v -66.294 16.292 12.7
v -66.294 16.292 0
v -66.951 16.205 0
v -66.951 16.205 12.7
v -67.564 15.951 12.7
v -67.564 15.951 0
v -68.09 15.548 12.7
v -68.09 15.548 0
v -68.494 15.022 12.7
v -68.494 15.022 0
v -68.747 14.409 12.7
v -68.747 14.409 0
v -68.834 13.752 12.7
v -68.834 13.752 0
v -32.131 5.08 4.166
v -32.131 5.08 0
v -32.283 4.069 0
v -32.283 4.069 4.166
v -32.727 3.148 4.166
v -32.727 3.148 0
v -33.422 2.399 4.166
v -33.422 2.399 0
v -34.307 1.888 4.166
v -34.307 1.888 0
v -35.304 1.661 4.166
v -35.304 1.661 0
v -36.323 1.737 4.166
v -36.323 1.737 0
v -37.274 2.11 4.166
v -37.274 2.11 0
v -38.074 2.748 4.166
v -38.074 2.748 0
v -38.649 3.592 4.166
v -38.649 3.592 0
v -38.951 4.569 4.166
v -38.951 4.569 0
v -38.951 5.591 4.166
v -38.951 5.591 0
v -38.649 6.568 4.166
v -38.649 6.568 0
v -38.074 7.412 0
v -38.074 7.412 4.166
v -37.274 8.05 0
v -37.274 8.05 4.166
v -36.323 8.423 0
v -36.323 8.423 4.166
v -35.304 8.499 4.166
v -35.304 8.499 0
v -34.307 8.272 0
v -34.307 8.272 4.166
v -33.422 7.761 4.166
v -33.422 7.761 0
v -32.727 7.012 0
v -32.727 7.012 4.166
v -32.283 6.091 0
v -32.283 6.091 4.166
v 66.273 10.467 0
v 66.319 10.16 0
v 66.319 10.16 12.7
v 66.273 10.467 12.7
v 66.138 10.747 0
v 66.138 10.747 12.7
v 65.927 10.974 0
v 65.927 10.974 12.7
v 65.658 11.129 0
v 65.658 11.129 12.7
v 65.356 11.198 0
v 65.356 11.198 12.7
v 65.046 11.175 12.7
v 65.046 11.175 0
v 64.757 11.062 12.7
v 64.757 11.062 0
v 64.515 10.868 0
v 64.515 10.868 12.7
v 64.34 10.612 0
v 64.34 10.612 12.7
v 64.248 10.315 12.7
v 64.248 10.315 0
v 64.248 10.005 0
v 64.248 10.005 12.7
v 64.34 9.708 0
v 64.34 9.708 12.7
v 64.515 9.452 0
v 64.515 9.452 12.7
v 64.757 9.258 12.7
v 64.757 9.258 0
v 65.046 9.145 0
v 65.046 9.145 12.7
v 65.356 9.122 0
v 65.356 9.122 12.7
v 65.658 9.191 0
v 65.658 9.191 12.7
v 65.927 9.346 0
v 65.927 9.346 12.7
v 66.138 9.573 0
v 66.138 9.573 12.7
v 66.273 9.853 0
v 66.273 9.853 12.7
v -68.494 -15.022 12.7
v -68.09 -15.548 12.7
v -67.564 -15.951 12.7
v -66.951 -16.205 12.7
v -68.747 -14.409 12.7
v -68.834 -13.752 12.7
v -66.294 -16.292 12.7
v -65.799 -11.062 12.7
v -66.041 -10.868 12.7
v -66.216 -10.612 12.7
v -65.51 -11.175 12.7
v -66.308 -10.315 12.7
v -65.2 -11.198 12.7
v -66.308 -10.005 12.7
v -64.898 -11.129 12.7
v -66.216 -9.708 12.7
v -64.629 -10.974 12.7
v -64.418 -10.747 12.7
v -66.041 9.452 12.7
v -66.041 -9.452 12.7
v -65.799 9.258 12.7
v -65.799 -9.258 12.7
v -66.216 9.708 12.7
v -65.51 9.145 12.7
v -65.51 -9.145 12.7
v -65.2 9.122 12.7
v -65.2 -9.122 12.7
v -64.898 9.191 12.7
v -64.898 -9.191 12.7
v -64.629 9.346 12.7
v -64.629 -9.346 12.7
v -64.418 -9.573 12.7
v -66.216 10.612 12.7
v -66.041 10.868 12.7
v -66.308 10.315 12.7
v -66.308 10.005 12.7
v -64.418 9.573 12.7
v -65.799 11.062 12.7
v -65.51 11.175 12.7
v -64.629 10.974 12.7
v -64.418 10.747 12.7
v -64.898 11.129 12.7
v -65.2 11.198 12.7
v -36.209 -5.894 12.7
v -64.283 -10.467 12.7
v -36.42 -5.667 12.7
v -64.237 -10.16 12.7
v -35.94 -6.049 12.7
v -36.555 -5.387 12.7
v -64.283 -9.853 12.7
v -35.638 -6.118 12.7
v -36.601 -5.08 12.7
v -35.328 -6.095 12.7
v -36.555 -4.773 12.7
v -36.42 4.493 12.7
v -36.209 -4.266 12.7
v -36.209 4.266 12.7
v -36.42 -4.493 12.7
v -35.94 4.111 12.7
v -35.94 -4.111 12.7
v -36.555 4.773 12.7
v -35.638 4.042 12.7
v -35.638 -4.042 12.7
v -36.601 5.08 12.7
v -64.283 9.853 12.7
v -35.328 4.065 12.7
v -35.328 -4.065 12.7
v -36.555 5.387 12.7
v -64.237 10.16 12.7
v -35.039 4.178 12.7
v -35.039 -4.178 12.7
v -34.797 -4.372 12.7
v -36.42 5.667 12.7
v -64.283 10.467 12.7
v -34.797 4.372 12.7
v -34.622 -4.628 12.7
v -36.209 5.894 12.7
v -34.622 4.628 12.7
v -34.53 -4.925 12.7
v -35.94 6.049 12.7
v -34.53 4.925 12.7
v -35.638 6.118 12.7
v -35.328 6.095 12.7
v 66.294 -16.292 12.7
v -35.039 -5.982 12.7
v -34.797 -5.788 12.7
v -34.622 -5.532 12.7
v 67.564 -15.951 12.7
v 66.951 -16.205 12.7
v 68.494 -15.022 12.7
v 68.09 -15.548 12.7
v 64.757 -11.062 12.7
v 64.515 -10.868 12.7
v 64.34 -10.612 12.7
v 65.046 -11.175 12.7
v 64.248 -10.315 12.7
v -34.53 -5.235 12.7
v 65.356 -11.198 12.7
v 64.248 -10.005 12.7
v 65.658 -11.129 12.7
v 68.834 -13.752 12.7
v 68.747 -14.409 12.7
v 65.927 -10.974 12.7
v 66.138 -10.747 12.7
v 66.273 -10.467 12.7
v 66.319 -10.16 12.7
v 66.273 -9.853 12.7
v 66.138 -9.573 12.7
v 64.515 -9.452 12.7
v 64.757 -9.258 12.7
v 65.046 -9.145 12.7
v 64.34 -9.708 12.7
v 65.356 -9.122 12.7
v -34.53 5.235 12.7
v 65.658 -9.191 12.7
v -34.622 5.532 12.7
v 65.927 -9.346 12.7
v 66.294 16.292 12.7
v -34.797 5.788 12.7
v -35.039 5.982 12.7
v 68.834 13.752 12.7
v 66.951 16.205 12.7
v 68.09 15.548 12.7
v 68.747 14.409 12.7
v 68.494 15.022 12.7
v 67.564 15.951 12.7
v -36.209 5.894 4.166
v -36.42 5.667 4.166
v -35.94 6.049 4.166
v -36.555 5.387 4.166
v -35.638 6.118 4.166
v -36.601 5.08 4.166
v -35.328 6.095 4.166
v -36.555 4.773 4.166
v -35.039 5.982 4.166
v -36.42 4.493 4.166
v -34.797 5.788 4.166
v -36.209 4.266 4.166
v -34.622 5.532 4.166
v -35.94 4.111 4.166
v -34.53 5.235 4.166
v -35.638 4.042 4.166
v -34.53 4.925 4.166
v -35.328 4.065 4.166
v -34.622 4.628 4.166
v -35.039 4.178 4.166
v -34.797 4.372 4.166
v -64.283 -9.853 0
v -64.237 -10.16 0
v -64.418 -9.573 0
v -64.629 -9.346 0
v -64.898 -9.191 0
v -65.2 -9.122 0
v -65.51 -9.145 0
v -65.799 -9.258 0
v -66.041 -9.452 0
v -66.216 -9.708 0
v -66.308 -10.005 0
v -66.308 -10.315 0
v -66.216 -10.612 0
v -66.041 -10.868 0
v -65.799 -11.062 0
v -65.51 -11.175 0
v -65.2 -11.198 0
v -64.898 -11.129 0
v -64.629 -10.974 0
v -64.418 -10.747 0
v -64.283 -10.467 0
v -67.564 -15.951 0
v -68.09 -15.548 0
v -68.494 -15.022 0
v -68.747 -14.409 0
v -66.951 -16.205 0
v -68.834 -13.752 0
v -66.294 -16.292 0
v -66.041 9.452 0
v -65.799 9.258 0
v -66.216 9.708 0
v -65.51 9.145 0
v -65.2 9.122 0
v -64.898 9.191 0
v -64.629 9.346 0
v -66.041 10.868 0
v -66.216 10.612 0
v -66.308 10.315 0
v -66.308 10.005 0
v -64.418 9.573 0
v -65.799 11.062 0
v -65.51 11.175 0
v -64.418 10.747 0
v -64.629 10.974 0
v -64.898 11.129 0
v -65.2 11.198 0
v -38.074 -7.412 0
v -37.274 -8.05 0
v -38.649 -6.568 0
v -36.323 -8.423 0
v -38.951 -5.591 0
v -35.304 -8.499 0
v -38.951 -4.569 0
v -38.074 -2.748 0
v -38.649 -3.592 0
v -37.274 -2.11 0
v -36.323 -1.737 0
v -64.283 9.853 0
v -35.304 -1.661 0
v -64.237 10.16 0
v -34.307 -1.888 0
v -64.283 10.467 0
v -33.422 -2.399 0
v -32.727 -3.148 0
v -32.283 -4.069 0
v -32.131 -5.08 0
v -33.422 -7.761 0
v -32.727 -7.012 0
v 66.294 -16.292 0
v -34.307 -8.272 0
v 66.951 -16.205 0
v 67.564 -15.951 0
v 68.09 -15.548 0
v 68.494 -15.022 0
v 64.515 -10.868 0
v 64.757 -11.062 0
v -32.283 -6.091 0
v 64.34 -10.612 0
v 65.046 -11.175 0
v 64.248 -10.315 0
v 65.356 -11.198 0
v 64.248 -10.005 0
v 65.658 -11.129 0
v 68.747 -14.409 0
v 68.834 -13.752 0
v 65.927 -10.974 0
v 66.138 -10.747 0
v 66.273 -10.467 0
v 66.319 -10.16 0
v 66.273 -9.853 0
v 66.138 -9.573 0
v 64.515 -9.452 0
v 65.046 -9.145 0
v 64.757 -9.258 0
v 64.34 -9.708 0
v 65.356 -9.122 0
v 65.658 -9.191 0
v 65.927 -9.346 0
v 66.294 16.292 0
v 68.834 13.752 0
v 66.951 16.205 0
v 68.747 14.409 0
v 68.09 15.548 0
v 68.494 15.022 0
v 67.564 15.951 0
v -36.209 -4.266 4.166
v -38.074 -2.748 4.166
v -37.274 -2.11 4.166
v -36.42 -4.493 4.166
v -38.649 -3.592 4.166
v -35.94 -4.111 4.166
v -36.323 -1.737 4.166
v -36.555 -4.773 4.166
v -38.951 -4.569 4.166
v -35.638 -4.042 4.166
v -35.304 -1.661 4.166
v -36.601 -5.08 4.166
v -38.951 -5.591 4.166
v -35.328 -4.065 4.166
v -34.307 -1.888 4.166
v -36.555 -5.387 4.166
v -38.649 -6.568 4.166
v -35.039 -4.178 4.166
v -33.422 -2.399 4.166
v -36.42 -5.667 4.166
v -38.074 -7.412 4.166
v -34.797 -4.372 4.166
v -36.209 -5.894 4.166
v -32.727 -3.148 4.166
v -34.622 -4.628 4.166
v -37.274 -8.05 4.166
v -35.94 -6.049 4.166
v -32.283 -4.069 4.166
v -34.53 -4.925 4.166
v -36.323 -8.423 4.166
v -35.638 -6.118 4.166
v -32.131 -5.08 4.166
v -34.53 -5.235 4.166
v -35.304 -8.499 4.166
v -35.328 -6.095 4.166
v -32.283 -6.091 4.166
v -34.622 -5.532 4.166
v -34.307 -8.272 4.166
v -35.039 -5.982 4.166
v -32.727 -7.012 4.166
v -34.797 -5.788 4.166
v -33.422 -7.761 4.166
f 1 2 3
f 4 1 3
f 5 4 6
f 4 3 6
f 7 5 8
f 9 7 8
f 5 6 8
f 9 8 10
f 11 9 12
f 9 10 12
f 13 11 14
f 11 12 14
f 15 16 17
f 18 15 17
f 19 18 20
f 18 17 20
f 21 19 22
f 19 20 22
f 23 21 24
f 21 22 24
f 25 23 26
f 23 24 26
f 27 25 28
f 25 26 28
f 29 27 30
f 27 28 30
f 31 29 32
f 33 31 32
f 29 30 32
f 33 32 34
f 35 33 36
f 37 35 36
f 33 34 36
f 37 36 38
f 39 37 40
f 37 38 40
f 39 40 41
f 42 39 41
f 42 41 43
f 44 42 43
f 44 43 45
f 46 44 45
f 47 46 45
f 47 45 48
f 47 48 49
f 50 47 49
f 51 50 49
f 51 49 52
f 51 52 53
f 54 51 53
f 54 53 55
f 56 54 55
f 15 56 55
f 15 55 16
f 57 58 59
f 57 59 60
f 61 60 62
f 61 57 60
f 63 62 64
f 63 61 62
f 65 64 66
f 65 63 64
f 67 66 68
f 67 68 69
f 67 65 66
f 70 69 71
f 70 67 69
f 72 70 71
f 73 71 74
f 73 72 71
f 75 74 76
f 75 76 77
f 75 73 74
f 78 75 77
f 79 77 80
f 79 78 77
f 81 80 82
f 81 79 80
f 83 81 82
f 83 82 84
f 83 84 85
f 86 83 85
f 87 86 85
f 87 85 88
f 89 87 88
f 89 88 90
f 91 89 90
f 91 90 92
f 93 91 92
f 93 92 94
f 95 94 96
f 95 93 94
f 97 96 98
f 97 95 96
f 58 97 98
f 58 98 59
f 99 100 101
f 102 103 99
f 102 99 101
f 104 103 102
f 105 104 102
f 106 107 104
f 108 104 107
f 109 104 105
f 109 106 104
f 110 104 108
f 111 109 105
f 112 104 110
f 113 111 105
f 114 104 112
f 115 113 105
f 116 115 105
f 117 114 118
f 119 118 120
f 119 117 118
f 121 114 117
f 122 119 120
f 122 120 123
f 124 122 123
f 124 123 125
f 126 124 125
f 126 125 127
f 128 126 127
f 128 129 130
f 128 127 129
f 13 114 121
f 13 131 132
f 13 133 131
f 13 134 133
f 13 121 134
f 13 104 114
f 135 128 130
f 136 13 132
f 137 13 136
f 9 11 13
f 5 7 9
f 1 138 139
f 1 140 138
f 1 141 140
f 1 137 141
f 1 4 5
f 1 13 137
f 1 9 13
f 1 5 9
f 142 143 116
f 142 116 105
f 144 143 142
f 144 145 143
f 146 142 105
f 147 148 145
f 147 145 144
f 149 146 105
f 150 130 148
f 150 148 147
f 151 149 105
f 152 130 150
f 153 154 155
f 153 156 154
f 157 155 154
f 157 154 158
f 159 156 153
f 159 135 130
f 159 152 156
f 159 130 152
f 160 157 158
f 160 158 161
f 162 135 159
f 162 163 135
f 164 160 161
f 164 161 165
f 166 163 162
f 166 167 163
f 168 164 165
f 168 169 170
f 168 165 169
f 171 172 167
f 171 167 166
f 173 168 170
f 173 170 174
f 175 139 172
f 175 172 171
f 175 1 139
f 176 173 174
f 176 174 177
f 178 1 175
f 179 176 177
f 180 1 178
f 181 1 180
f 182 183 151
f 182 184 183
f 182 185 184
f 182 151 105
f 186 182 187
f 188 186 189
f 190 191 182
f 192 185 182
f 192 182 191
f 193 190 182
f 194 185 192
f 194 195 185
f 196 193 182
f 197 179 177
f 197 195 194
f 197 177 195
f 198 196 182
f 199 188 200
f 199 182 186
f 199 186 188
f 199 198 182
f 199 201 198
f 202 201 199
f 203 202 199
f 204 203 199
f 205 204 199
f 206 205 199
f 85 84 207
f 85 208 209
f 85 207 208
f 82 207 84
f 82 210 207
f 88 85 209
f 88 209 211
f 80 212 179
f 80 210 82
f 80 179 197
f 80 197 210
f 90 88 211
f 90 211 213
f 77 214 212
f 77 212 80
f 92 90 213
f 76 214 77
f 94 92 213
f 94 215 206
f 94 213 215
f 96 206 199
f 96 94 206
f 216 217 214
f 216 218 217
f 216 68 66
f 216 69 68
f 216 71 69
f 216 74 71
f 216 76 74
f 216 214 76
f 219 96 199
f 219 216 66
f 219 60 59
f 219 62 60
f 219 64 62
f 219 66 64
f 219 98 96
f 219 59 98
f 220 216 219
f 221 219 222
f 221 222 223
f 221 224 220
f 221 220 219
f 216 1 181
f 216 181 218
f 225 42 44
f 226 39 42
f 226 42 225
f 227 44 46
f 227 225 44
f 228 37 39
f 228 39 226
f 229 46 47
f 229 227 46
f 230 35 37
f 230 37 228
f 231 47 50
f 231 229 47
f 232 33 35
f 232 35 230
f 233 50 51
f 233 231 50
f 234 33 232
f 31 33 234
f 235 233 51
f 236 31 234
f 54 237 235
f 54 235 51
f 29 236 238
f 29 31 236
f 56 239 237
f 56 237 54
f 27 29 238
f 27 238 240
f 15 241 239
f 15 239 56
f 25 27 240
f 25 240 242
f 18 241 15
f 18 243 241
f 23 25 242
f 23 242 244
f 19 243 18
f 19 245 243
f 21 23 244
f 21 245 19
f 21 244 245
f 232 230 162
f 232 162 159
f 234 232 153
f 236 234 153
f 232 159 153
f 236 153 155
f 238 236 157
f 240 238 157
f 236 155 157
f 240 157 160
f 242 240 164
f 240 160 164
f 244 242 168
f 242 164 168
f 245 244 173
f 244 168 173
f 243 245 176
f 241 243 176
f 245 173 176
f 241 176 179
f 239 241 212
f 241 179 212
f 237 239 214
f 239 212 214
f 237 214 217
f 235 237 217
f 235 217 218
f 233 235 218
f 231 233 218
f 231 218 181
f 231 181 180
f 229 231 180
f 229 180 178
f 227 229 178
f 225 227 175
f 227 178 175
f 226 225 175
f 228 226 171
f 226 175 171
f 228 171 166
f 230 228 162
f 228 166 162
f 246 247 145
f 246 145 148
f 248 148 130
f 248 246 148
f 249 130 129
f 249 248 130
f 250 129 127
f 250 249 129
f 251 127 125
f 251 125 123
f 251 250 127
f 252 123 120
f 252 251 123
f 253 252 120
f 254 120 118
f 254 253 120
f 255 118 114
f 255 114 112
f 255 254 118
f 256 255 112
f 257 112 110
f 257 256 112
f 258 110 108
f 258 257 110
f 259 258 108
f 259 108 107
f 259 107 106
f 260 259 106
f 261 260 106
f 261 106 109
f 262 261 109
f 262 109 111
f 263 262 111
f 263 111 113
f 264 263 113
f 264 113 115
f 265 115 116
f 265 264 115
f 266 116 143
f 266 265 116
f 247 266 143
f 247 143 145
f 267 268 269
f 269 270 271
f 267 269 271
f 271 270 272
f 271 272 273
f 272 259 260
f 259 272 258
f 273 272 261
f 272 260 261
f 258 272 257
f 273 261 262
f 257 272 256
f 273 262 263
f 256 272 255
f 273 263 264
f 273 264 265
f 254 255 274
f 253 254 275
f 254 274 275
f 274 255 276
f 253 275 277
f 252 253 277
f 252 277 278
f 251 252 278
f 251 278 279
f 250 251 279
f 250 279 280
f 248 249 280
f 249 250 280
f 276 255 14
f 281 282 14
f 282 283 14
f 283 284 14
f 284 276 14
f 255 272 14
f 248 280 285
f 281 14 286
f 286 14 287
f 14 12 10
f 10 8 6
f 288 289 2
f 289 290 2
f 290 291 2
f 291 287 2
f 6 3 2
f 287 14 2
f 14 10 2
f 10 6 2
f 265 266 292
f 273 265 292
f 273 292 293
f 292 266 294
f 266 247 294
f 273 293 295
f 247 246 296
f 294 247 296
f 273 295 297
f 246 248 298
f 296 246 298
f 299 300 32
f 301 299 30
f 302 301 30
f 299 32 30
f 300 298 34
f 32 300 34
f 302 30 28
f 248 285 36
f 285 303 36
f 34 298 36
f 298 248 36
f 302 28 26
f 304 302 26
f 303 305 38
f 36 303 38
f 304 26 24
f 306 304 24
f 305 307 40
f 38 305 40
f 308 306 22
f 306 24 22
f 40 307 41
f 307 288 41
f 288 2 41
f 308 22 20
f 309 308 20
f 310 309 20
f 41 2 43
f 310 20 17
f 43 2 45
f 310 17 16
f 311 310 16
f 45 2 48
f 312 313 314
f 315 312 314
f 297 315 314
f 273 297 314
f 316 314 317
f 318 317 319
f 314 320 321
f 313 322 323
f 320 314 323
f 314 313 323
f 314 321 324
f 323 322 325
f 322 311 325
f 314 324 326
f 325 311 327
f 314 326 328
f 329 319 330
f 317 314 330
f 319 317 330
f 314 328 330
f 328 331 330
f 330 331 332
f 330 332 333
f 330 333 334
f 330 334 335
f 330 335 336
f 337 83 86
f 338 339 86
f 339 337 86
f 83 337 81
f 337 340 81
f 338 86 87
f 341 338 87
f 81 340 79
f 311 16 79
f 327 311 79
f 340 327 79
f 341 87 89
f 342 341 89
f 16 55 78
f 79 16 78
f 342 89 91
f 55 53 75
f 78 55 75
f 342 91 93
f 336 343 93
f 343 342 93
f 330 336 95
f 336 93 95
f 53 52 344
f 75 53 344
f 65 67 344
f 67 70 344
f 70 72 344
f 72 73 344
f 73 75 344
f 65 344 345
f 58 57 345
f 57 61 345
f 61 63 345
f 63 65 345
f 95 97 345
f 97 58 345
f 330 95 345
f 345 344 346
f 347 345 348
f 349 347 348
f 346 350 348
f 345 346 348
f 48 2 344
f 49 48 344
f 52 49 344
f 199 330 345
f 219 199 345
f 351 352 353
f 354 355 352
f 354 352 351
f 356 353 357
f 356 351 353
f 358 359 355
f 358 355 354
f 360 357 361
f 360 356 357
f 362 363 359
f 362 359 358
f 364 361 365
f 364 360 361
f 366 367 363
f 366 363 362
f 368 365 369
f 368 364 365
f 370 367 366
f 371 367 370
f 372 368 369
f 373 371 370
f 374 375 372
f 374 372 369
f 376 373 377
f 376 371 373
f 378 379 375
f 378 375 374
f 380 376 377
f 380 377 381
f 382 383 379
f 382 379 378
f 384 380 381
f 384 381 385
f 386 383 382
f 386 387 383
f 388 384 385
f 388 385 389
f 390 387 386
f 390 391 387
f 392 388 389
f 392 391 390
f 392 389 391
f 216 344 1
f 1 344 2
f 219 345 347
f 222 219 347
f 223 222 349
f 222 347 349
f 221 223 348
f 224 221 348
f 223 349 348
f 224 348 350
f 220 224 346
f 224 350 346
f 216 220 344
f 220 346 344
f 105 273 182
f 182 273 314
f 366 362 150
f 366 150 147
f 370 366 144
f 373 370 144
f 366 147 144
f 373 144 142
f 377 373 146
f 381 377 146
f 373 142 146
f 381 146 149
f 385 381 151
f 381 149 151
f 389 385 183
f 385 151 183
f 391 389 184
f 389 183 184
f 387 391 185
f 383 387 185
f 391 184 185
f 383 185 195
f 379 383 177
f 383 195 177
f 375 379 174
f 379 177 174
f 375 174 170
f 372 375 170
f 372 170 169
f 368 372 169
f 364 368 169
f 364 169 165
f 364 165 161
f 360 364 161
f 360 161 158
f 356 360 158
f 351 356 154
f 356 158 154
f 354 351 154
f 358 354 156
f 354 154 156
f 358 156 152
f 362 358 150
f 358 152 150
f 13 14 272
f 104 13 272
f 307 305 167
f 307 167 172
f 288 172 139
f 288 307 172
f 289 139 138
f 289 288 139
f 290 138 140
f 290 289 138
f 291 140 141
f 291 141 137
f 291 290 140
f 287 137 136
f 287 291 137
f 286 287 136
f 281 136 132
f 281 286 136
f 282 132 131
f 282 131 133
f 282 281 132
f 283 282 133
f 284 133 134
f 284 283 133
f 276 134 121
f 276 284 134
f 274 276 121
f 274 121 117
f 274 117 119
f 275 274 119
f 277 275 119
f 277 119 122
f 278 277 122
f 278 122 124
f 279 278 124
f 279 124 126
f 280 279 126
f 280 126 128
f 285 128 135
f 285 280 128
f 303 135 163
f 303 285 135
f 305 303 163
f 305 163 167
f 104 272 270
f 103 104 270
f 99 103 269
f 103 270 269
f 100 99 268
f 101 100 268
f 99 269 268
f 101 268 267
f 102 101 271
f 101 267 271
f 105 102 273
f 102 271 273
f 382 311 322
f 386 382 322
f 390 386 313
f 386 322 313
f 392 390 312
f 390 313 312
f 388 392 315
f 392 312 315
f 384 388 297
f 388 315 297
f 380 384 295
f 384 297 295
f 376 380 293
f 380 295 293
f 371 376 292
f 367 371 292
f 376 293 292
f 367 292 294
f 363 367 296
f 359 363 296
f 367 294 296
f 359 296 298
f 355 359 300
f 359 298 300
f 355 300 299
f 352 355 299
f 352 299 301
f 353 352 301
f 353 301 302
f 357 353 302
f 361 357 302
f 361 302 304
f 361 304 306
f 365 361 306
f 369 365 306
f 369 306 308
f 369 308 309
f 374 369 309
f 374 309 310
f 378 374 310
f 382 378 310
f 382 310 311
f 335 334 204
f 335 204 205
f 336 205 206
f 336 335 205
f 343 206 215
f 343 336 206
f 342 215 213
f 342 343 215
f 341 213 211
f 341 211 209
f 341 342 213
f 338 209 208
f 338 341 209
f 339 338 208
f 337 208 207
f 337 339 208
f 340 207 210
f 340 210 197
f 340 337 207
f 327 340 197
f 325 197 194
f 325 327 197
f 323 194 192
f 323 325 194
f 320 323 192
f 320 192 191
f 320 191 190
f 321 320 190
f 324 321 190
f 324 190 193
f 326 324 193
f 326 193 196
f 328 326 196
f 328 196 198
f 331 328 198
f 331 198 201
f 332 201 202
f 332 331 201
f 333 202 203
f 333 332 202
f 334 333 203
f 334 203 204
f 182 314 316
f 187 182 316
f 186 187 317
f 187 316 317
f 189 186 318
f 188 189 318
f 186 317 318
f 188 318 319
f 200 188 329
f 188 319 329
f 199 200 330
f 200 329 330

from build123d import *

# Parameters (mm, degrees)
F0_R           = 1.0414
F1_DEPTH       = 12.7
F3_D           = 2.0828
F3_CBORE_D     = 6.858
F3_CBORE_DEPTH = 4.1656


with BuildPart() as f1:
    # F0 (on Top) → F1 (new body)
    with BuildSketch(Plane.XY):
        with BuildLine():
            ThreePointArc((-68.834, -13.75156), (-68.090051, -15.547611), (-66.294, -16.29156))
            Line((-66.294, -16.29156), (66.294, -16.29156))
            ThreePointArc((66.294, -16.29156), (68.090051, -15.547611), (68.834, -13.75156))
            Line((68.834, -13.75156), (68.834, 13.75156))
            ThreePointArc((68.834, 13.75156), (68.090051, 15.547611), (66.294, 16.29156))
            Line((66.294, 16.29156), (-66.294, 16.29156))
            ThreePointArc((-66.294, 16.29156), (-68.090051, 15.547611), (-68.834, 13.75156))
            Line((-68.834, 13.75156), (-68.834, -13.75156))
        make_face()
        with Locations((-65.278, -10.16)):
            Circle(F0_R, mode=Mode.SUBTRACT)
        with Locations((65.278, -10.16)):
            Circle(F0_R, mode=Mode.SUBTRACT)
        with Locations((-65.278, 10.16)):
            Circle(F0_R, mode=Mode.SUBTRACT)
        with Locations((65.278, 10.16)):
            Circle(F0_R, mode=Mode.SUBTRACT)
    extrude(amount=F1_DEPTH)

    # F3 (through all)
    with Locations(Plane(origin=(0, 0, 0), x_dir=(1, 0, 0), z_dir=(0, 0, -1))):
        with Locations((-35.56, 5.08), (-35.56, -5.08)):
            CounterBoreHole(F3_D / 2, F3_CBORE_D / 2, F3_CBORE_DEPTH)


solid = f1.part
